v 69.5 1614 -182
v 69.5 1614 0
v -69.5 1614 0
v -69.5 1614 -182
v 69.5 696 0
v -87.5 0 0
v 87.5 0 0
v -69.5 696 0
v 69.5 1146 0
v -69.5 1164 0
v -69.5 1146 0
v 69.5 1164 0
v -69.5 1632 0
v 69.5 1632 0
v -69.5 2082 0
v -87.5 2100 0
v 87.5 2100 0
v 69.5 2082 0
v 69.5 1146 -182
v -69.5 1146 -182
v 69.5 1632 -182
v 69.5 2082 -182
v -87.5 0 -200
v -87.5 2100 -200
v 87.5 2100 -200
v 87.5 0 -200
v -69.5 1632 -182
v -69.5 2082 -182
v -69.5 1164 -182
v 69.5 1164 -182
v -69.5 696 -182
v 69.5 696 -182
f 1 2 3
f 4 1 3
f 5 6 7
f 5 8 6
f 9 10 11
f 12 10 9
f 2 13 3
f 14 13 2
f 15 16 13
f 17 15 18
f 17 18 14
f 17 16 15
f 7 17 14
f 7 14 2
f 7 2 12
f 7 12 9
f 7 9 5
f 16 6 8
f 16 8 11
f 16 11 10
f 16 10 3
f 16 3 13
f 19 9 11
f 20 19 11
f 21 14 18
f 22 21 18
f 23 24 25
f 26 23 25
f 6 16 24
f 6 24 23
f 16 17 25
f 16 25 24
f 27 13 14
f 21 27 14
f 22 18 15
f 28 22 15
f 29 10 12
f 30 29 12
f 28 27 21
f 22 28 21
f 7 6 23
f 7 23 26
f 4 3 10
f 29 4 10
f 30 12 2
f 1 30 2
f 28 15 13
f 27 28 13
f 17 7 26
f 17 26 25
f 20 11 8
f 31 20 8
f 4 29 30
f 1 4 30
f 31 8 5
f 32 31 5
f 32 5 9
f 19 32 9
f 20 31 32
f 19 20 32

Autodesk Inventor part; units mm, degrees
ref_plane "YZ Plane" through (0, 0, 0) normal (1, 0, 0) x (0, 1, 0)
ref_plane "XZ Plane" through (0, 0, 0) normal (0, 1, 0) x (-1, 0, 0)
ref_plane "XY Plane" through (0, 0, 0) normal (0, 0, 1) x (1, 0, 0)
sketch "Schizzo1" plane through (0, 0, 0) normal (0, 0, 1) x (1, 0, 0)
  line L0 (-87.5, 0) -> (87.5, 0)
  line L1 (87.5, 0) -> (87.5, 2100)
  line L2 (87.5, 2100) -> (-87.5, 2100)
  line L3 (-87.5, 2100) -> (-87.5, 0)
  point P0 (0, 0)
  point P1 (0, 0)
  dimension "d0" = 175
  dimension "d1" = 2100
extrude "Estrusione1" add sketch "Schizzo1" against normal blind 200
shell "Svuotamento1" thickness 18 removed faces 1 at (-29.1667, 1400, 0)
sketch "Schizzo2" plane through (0, 0, 0) normal (0, 0, 1) x (1, 0, 0)
  line L0 (-69.5, 18) -> (-69.5, 2082) projected
  line L1 (69.5, 2082) -> (69.5, 18) projected
  line L2 (-69.5, 1632) -> (69.5, 1632)
  line L3 (69.5, 1632) -> (69.5, 1614)
  line L4 (69.5, 1614) -> (-69.5, 1614)
  line L5 (-69.5, 1614) -> (-69.5, 1632)
  line L6 (-69.5, 1164) -> (69.5, 1164)
  line L7 (69.5, 1164) -> (69.5, 1146)
  line L8 (69.5, 1146) -> (-69.5, 1146)
  line L9 (-69.5, 1146) -> (-69.5, 1164)
  line L10 (-69.5, 18) -> (-69.5, 2082) projected
  line L11 (69.5, 2082) -> (69.5, 18) projected
  line L12 (-69.5, 696) -> (69.5, 696)
  line L13 (69.5, 696) -> (69.5, 18)
  line L14 (69.5, 18) -> (-69.5, 18)
  line L15 (-69.5, 18) -> (-69.5, 696)
  point P0 (0, 0)
  point P1 (69.5, 1614)
  point P2 (69.5, 1632)
  point P3 (-69.5, 1632)
  point P4 (69.5, 1146)
  point P5 (69.5, 1164)
  point P6 (-69.5, 1164)
  point P7 (69.5, 18)
  dimension "d6" = 18
  dimension "d7" = 450
  dimension "d8" = 450
  dimension "d12" = 450
  dimension "d13" = 678
extrude "Estrusione2" add sketch "Schizzo2" against normal up to surface (182 mm away) contours L0 L12 L1 L14 | L0 L6 L1 L8 | L0 L2 L1 L4
equation "\"d8\" = d7"
equation "\"d12\" = d7"
properties part number "Mobiletto verticale"
